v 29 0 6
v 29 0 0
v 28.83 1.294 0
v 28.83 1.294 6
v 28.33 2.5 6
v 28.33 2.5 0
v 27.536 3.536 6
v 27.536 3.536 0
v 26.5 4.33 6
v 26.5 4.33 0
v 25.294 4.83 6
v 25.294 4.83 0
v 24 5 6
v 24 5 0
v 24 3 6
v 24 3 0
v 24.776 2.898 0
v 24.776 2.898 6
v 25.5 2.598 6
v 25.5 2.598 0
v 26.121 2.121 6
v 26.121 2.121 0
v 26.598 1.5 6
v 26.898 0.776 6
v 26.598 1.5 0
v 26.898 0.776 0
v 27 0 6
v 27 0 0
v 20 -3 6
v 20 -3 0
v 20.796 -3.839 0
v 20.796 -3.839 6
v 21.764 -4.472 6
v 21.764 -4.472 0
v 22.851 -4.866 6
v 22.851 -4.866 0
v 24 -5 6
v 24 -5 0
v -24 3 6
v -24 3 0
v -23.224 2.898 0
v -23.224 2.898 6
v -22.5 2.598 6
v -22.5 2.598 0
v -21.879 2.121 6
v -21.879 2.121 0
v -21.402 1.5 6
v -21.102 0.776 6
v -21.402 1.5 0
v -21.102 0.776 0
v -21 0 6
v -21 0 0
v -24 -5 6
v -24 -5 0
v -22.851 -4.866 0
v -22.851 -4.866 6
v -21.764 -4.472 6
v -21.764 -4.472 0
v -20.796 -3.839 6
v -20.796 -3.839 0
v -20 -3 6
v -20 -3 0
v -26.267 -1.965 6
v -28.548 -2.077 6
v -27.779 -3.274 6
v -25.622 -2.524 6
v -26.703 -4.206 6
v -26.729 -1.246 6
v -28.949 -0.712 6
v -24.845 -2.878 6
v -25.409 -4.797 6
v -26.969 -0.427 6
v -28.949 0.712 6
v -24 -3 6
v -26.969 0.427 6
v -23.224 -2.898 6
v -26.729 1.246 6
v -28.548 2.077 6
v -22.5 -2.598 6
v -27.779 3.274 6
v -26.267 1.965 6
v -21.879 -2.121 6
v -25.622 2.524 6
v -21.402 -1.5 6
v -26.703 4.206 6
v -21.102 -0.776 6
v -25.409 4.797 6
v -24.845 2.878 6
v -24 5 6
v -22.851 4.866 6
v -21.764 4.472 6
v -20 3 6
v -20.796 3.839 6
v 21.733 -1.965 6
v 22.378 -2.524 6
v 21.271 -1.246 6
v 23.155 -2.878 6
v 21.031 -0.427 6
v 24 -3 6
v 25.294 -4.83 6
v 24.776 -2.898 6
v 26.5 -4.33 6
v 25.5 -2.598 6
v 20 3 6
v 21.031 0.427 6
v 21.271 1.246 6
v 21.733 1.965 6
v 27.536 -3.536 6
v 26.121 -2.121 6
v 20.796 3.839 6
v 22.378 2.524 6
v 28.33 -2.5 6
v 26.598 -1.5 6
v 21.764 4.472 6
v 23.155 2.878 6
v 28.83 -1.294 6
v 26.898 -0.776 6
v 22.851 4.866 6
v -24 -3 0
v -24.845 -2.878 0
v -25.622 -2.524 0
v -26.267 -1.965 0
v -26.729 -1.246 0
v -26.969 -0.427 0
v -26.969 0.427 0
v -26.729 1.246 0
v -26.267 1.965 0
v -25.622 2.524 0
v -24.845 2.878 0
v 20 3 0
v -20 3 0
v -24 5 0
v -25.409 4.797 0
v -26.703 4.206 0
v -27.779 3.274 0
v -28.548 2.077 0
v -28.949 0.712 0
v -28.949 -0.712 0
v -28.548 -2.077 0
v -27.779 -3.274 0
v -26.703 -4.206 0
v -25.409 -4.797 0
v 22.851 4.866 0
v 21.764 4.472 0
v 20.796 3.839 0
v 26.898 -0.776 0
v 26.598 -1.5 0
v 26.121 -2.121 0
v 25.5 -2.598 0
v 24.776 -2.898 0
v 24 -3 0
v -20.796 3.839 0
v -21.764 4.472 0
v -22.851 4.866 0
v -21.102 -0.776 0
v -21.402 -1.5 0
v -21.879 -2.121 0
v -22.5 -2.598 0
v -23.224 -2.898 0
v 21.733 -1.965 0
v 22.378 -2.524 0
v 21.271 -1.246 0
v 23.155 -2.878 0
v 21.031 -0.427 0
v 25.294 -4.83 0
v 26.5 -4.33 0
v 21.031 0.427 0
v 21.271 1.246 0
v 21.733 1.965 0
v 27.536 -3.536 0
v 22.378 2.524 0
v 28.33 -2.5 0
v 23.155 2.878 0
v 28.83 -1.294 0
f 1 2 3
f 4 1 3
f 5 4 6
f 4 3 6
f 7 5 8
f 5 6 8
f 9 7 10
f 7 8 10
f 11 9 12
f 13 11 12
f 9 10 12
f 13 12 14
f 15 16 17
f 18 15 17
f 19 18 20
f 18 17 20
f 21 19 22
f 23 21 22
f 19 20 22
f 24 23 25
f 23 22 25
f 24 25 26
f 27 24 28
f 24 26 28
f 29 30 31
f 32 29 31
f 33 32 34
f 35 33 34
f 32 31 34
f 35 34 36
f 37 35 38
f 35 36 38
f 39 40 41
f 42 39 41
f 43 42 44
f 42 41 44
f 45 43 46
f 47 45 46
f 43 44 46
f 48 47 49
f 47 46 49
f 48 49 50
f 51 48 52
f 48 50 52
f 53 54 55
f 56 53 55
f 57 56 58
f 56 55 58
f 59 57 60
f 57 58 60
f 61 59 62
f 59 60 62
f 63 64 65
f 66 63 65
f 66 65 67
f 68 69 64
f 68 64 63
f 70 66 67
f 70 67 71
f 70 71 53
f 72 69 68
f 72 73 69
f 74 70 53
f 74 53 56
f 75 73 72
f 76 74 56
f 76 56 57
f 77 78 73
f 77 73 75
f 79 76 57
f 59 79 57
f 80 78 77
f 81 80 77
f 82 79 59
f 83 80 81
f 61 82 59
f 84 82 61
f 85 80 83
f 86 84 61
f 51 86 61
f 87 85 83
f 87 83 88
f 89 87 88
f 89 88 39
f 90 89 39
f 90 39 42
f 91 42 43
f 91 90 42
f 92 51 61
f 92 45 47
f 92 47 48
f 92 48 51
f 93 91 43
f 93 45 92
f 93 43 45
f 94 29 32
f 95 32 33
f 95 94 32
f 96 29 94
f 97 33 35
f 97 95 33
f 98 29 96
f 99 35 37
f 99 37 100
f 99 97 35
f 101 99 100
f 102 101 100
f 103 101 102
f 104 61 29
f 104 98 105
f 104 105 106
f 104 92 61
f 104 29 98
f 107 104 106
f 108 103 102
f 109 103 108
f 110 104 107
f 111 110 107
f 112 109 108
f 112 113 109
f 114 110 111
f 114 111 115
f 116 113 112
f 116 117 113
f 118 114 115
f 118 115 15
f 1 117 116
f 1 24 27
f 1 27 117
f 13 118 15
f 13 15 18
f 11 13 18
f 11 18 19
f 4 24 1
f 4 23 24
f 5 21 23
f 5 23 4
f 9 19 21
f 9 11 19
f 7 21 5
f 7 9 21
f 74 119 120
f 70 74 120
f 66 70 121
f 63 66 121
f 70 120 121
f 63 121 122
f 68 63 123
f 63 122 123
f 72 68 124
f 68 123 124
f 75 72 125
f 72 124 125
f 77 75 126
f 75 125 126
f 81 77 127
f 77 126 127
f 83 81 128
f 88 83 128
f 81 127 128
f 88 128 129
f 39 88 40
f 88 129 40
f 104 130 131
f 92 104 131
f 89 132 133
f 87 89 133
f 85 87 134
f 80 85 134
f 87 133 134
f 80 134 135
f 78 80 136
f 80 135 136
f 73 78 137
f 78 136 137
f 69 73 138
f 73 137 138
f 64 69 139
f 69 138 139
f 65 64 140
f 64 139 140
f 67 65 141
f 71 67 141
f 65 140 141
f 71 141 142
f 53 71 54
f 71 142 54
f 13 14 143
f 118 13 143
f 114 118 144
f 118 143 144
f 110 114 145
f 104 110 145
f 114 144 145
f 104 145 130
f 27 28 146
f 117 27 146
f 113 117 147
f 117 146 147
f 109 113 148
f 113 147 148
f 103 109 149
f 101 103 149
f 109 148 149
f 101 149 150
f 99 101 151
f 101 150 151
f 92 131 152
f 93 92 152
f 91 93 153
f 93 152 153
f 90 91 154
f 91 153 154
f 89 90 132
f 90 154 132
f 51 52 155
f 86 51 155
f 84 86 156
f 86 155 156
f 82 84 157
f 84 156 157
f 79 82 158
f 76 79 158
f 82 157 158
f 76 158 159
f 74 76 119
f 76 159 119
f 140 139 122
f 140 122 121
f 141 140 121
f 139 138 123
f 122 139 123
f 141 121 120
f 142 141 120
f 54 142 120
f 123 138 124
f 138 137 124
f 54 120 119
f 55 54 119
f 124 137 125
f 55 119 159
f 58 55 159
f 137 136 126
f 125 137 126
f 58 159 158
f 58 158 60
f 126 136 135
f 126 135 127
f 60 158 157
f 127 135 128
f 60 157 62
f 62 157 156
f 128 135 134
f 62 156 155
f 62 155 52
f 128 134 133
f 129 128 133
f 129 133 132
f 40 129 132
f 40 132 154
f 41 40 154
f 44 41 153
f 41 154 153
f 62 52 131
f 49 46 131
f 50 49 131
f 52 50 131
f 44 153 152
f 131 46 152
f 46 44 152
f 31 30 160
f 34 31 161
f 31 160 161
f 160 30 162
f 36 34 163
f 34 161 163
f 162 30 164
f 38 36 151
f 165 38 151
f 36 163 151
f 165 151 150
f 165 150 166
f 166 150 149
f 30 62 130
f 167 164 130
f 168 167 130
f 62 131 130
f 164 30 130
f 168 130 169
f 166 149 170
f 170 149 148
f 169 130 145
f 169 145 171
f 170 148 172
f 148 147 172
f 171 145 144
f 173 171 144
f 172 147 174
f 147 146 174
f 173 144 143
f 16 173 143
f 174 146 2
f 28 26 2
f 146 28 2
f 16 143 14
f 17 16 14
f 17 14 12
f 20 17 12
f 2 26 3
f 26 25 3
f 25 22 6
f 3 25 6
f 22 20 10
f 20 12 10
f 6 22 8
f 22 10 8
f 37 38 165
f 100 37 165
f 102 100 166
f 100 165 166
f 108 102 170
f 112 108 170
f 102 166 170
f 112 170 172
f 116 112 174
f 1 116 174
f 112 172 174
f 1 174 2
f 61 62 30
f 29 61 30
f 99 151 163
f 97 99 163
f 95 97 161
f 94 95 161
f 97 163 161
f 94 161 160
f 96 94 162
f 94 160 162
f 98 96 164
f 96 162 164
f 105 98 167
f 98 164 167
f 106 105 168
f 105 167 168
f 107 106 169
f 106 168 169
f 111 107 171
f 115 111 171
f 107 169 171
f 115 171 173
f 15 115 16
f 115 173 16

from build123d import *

# Parameters (mm, degrees)
EXTRUDE_1_DEPTH = 6


with BuildPart() as part:
    # 草图1 → 凸台-拉伸1 (new body)
    with BuildSketch(Plane.XY):
        with BuildLine():
            Line((20, 3), (-20, 3))
            ThreePointArc((-20, 3), (-19.25658351, 1.58113883), (-19, 0))
            ThreePointArc((-19, 0), (-19.25658351, -1.58113883), (-20, -3))
            Line((-20, -3), (20, -3))
            ThreePointArc((20, -3), (19, 0), (20, 3))
        make_face()
        with BuildLine():
            ThreePointArc((-24, -3), (-27, 0), (-24, 3))
            Line((-24, 3), (-20, 3))
            ThreePointArc((-20, 3), (-21.763932022, 4.472135955), (-24, 5))
            ThreePointArc((-24, 5), (-29, 0), (-24, -5))
            ThreePointArc((-24, -5), (-21.763932022, -4.472135955), (-20, -3))
            Line((-20, -3), (-24, -3))
        make_face()
        with BuildLine():
            Line((-20, 3), (-24, 3))
            ThreePointArc((-24, 3), (-21.878679656, 2.121320344), (-21, 0))
            ThreePointArc((-21, 0), (-21.878679656, -2.121320344), (-24, -3))
            Line((-24, -3), (-20, -3))
            ThreePointArc((-20, -3), (-19.25658351, -1.58113883), (-19, 0))
            ThreePointArc((-19, 0), (-19.25658351, 1.58113883), (-20, 3))
        make_face()
        with BuildLine():
            ThreePointArc((24, 5), (21.763932023, 4.472135955), (20, 3))
            Line((20, 3), (24, 3))
            ThreePointArc((24, 3), (26.121320344, 2.121320344), (27, 0))
            ThreePointArc((27, 0), (26.121320344, -2.121320344), (24, -3))
            Line((24, -3), (20, -3))
            ThreePointArc((20, -3), (21.763931997, -4.472135942), (23.999999943, -5))
            ThreePointArc((23.999999943, -5), (27.535533886, -3.535533926), (29, 0))
            ThreePointArc((29, 0), (27.535533906, 3.535533906), (24, 5))
        make_face()
        with BuildLine():
            Line((24, 3), (20, 3))
            ThreePointArc((20, 3), (19, 0), (20, -3))
            Line((20, -3), (24, -3))
            ThreePointArc((24, -3), (21, 0), (24, 3))
        make_face()
    extrude(amount=EXTRUDE_1_DEPTH)


solid = part.part
